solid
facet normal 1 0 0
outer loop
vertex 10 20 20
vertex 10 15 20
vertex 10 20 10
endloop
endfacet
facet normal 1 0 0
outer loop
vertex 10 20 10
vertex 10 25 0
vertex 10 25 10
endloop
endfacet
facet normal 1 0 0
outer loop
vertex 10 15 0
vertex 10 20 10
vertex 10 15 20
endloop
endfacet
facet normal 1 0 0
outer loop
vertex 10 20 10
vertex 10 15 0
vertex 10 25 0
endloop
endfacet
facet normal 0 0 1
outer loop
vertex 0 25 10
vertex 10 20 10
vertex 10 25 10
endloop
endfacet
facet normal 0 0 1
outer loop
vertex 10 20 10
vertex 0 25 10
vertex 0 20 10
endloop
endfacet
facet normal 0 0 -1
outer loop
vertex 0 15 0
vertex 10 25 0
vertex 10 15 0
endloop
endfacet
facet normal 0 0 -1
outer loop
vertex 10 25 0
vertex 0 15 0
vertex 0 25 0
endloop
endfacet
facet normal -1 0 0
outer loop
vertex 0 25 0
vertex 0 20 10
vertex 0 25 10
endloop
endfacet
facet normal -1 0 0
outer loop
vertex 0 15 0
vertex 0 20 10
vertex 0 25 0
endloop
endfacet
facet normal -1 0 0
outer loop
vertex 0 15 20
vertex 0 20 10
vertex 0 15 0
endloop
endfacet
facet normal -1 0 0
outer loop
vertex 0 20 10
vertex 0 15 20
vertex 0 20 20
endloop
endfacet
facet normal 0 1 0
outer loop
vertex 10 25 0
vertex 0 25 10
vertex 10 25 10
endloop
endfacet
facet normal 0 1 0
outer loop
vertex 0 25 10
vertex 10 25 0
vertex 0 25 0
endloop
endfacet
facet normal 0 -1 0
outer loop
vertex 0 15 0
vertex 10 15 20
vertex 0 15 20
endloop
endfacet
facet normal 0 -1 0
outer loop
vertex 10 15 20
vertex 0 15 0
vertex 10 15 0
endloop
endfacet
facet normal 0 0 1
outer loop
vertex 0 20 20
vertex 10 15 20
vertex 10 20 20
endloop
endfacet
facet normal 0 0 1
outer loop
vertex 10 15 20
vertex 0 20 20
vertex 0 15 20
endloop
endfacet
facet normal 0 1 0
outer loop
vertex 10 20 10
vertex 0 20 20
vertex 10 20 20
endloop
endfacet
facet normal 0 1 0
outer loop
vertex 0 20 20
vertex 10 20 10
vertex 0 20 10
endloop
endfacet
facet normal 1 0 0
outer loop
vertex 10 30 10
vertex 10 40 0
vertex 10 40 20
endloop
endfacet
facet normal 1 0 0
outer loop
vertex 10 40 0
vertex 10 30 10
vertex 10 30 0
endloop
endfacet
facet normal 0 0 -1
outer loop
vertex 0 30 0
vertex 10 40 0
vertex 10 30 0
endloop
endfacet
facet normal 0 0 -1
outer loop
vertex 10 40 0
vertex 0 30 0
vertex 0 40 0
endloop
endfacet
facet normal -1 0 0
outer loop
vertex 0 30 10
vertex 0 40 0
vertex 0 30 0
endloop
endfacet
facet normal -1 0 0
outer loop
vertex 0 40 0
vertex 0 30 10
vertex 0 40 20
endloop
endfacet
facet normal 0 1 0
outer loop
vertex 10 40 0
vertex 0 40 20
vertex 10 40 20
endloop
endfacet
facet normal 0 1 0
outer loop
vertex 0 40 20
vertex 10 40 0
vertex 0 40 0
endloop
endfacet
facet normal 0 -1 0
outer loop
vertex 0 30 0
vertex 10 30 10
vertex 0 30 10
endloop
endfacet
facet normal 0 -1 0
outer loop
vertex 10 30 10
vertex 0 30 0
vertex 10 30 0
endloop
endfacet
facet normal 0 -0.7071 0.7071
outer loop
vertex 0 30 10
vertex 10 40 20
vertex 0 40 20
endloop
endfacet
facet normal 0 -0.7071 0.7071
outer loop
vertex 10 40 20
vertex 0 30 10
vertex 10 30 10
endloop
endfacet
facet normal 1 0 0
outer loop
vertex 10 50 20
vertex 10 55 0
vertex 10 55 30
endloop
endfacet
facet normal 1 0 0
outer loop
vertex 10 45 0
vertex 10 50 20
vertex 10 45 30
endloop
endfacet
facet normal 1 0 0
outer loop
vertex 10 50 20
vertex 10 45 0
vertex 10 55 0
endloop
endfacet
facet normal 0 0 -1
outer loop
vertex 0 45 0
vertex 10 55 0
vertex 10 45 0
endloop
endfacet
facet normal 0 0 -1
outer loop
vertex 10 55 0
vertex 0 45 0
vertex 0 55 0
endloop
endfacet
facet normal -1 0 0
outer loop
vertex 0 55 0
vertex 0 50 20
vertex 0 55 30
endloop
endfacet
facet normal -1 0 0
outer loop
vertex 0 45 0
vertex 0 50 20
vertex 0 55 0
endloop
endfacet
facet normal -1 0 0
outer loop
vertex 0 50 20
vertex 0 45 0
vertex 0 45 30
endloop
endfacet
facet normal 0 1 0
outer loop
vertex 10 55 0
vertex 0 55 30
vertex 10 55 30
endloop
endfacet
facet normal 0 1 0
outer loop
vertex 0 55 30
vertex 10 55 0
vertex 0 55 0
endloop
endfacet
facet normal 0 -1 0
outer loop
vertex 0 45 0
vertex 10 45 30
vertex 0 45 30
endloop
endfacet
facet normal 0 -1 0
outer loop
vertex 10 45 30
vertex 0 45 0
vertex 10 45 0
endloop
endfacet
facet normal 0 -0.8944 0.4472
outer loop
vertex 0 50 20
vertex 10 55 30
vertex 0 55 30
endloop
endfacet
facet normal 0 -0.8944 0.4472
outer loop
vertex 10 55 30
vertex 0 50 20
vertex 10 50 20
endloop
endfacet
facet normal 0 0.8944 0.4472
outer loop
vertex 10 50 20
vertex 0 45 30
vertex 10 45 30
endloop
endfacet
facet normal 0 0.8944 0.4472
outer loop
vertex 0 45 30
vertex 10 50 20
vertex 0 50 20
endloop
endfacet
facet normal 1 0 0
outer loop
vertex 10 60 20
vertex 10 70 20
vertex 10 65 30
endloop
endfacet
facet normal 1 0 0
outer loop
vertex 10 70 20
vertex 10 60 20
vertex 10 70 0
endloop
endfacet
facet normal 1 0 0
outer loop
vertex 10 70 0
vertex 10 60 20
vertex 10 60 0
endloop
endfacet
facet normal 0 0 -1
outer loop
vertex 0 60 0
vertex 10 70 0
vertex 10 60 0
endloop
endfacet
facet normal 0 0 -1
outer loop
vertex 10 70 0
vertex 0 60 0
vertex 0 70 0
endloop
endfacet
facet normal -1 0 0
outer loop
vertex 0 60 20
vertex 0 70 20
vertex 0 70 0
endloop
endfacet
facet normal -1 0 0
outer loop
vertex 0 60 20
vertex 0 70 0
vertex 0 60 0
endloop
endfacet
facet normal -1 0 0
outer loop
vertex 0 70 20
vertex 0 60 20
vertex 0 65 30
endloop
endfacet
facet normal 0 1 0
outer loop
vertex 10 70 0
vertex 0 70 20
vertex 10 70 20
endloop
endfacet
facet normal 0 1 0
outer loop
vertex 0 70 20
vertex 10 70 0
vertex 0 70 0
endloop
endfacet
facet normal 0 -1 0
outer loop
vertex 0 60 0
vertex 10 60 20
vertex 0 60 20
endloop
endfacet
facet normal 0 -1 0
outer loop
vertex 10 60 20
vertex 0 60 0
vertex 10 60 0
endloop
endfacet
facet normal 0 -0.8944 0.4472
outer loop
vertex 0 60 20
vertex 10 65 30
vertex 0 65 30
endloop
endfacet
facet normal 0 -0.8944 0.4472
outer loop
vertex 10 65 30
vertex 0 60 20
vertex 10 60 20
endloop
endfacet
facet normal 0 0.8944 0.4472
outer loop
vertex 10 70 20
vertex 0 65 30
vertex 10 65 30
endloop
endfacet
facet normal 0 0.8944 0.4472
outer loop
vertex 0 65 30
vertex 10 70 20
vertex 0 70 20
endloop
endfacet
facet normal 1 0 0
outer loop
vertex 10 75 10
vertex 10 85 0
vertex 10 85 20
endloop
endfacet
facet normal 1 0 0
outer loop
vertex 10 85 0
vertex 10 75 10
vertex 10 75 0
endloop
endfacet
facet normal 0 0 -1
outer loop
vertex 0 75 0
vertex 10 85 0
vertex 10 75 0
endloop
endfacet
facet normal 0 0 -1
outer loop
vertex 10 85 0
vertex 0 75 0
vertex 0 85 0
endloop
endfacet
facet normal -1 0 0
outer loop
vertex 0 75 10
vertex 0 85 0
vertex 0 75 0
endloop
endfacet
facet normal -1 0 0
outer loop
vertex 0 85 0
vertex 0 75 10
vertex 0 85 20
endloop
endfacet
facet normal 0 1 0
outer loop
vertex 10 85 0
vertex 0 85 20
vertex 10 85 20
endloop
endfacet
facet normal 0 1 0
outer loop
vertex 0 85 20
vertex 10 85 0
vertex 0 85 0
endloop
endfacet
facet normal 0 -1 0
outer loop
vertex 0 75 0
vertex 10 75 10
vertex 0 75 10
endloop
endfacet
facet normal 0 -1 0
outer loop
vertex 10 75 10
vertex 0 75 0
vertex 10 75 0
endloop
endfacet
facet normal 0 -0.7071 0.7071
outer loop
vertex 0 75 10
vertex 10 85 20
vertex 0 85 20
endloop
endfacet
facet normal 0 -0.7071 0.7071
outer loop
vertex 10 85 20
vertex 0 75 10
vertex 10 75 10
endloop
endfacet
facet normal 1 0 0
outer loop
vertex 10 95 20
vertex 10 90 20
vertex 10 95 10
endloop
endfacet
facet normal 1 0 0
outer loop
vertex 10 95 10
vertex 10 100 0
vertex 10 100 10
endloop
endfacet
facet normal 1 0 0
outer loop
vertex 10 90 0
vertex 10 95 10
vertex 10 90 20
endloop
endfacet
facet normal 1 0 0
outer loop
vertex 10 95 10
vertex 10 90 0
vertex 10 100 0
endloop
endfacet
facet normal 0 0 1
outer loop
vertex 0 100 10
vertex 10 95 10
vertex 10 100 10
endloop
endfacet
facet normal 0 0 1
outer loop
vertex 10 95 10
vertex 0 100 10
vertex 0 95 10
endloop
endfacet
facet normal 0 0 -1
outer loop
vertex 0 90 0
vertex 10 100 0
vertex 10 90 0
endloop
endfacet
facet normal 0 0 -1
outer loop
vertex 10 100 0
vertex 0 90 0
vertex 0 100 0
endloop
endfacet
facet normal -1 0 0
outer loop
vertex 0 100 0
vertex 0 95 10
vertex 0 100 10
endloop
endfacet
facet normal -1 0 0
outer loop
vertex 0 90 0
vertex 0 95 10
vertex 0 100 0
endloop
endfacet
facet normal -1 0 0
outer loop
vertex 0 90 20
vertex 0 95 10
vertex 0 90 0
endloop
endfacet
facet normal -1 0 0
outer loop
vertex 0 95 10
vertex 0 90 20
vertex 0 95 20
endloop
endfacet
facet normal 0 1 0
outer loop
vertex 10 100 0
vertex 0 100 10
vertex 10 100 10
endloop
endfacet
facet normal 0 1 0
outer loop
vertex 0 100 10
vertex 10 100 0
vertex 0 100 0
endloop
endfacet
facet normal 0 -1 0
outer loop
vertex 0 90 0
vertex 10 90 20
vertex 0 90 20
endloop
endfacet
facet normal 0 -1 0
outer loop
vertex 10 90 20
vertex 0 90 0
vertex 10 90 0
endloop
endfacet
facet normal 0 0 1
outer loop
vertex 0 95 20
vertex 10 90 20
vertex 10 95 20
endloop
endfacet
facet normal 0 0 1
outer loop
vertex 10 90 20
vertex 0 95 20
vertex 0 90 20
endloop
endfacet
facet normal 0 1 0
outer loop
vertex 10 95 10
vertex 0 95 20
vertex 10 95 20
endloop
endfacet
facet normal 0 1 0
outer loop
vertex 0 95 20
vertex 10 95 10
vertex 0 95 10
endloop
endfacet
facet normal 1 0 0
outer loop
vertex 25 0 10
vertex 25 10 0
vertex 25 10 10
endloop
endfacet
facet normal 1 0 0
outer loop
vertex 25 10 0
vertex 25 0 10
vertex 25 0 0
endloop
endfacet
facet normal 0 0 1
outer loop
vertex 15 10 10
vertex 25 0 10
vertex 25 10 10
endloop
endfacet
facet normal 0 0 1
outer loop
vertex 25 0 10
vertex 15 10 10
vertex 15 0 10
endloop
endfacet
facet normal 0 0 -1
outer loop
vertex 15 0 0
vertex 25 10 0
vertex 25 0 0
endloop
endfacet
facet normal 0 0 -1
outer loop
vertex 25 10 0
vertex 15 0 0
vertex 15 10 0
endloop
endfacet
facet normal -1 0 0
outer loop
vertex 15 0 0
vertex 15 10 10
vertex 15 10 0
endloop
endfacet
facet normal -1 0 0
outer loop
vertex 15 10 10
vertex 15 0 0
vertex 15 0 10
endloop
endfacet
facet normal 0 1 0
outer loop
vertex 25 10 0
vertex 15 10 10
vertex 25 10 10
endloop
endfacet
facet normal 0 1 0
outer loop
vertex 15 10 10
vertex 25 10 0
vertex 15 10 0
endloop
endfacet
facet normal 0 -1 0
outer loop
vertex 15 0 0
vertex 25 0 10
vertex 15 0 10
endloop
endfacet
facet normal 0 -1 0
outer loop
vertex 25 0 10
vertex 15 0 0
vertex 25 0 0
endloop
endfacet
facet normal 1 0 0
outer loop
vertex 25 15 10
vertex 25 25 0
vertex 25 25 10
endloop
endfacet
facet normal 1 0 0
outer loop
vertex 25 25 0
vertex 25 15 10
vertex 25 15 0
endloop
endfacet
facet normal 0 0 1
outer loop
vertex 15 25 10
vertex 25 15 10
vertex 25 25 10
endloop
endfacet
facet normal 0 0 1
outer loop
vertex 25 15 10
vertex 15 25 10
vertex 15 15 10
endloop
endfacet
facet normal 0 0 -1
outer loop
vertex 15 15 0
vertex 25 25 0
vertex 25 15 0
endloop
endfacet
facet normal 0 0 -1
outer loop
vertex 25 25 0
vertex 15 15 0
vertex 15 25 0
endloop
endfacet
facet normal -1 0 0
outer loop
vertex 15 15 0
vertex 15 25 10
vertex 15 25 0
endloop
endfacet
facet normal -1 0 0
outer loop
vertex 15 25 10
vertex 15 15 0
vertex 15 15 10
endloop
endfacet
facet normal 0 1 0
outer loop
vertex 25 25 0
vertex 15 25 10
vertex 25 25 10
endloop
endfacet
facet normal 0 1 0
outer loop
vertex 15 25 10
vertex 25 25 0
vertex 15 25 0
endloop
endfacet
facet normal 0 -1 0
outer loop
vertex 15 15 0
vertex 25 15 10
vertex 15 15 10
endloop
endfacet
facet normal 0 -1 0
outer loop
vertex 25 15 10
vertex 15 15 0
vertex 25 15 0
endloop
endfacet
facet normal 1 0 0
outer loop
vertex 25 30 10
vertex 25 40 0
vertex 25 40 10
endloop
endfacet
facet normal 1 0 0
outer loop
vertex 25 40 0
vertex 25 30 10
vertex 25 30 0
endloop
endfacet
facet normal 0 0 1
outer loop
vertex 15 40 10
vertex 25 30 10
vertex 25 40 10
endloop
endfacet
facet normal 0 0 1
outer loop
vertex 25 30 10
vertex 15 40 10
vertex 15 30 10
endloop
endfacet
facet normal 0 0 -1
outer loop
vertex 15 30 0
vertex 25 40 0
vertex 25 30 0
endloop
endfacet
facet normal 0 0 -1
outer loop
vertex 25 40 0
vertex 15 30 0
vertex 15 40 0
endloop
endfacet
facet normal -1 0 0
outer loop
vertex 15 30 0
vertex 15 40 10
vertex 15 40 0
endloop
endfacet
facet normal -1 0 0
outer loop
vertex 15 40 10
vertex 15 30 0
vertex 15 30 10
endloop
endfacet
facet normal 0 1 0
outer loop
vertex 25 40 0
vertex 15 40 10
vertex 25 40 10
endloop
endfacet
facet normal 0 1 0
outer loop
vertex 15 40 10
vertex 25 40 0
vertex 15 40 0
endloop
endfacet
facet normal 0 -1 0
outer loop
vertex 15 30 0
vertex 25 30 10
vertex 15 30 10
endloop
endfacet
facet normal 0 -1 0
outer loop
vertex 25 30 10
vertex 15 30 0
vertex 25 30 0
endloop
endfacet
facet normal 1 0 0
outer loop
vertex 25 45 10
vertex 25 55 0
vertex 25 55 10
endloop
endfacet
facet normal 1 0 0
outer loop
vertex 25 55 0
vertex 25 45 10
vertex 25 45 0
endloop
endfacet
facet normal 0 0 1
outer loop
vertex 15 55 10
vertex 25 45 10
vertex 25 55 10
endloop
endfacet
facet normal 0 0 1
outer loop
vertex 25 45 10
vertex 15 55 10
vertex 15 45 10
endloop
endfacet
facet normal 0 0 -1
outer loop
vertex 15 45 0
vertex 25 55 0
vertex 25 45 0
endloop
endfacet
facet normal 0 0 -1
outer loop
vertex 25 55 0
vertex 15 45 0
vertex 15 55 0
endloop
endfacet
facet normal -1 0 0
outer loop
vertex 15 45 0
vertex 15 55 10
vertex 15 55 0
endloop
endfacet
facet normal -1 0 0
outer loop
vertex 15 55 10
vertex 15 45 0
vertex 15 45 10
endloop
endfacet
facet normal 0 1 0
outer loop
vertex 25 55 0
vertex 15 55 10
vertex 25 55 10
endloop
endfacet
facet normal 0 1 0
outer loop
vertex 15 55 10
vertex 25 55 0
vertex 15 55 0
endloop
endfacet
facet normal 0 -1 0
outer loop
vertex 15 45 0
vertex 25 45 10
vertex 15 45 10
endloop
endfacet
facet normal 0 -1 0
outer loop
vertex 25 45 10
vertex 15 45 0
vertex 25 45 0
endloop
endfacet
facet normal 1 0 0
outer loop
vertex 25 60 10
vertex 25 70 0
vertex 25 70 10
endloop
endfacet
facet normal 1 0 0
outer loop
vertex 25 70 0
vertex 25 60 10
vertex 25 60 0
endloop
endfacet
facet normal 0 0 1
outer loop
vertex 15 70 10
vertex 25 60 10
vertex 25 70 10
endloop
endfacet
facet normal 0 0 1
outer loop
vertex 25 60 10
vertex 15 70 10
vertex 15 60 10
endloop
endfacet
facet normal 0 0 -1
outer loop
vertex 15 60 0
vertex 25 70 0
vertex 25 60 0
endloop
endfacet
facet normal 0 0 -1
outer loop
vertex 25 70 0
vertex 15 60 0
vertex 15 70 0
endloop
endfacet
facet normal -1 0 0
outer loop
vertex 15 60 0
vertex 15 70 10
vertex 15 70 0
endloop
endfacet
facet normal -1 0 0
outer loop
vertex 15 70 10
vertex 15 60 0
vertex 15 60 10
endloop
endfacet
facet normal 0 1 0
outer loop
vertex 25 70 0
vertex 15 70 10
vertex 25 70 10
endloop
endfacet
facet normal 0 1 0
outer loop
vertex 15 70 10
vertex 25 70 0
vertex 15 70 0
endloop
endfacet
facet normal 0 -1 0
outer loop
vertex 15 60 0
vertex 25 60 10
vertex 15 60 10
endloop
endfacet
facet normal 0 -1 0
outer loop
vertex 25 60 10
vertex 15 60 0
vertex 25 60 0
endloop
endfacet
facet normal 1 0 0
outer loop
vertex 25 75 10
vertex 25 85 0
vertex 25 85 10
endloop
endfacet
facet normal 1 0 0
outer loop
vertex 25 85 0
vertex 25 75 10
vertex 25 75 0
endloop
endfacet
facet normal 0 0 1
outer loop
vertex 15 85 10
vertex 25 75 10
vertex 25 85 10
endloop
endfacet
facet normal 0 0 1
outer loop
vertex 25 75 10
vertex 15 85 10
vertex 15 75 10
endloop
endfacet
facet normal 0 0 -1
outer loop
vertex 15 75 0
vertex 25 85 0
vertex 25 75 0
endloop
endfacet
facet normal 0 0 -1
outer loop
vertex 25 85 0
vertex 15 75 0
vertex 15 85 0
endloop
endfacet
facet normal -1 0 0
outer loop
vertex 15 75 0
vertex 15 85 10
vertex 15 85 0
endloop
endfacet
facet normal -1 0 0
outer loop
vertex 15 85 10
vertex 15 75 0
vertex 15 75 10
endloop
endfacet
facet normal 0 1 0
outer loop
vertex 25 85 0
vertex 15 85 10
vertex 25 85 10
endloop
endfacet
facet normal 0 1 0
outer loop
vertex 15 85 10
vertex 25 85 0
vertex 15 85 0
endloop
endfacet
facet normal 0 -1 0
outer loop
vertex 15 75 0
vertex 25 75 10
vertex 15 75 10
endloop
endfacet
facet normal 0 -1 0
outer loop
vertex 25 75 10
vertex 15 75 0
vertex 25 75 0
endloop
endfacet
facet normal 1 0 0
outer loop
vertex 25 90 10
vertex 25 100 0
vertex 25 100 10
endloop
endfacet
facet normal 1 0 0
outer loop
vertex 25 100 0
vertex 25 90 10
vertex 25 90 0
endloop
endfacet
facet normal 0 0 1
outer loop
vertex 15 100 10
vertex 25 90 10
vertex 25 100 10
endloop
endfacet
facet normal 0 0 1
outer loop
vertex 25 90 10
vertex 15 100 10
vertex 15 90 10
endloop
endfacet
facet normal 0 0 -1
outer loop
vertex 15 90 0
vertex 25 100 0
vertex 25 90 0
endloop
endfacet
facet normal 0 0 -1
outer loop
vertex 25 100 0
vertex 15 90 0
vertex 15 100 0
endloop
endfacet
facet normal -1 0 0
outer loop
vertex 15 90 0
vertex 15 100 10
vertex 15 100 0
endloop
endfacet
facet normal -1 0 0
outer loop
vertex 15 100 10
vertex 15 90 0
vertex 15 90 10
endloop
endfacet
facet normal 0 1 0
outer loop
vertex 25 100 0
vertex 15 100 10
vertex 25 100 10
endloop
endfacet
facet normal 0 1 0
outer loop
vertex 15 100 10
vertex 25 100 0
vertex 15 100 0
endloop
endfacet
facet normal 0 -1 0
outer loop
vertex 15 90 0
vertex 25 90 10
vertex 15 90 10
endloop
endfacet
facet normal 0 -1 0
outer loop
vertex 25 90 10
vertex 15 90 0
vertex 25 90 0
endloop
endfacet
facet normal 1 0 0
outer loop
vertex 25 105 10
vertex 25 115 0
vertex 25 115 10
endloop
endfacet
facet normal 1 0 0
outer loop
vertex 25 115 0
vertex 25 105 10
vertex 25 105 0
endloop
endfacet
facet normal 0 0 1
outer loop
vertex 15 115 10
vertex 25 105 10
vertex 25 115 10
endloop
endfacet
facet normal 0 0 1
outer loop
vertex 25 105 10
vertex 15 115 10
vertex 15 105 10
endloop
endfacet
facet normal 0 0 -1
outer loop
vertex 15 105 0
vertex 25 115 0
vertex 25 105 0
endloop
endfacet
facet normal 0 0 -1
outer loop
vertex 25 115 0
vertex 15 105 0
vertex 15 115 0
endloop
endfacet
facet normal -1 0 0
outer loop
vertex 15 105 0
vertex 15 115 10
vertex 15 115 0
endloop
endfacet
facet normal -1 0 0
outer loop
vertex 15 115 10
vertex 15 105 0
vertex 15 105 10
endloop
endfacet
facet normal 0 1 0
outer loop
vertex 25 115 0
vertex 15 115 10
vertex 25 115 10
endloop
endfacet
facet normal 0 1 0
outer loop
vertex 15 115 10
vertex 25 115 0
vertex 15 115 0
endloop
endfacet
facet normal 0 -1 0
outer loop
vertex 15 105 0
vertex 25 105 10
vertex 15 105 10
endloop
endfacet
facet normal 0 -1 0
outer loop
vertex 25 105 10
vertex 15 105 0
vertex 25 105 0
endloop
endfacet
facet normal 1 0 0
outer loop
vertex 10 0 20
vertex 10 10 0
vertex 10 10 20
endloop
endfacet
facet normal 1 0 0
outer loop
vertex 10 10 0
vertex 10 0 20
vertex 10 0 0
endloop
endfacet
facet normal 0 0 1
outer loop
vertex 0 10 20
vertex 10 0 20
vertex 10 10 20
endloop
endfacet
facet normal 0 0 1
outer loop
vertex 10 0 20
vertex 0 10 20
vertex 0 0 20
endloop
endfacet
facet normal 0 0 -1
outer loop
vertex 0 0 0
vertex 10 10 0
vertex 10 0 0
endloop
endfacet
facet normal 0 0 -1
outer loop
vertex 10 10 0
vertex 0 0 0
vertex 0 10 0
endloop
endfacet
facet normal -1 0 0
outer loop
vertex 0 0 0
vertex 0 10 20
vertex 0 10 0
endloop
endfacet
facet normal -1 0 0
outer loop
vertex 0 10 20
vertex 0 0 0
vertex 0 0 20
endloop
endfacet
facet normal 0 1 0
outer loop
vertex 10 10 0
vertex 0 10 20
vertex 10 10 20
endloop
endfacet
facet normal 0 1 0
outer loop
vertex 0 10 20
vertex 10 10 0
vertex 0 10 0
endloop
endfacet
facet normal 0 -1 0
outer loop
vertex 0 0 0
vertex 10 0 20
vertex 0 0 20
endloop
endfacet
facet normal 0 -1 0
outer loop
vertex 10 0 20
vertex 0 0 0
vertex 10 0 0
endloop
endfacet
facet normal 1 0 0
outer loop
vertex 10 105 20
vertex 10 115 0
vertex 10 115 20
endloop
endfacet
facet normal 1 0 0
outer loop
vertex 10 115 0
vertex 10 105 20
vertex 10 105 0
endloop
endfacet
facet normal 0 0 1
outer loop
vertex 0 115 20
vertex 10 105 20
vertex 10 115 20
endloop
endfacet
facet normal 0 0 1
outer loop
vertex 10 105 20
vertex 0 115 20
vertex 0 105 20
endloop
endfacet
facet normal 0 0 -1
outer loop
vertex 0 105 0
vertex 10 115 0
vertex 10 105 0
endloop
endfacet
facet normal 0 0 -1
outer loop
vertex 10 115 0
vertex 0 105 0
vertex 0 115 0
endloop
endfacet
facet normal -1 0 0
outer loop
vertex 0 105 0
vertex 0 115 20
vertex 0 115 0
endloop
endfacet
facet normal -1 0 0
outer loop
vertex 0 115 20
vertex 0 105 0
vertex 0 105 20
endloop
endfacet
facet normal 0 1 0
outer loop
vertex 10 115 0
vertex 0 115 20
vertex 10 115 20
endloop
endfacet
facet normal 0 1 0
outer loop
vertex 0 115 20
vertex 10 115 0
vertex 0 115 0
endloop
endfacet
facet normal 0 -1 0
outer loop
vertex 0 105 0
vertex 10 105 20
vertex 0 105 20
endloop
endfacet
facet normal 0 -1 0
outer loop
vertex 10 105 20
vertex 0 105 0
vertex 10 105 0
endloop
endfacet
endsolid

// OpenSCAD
H=10;
L=10;
W=10;
S=5;
D=3;

// --------------------------------
// --------------------------------
// --------------------------------

//board();
//pawnGrid();

translate([0,0*(H+S),0])rook();
translate([0,1*(H+S),0])knight();
translate([0,2*(H+S),0])bishop();
translate([0,3*(H+S),0])queen();
translate([0,4*(H+S),0])king();
translate([0,5*(H+S),0])bishop();
translate([0,6*(H+S),0])knight();
translate([0,7*(H+S),0])rook();
translate([H+S,0,0])pawnRow();

// --------------------------------
// --------------------------------
// --------------------------------

module prism(l, w, h){
       polyhedron(
               points=[[0,0,0], [l,0,0], [l,w,0], [0,w,0], [0,w,h], [l,w,h]],
               faces=[[0,1,2,3],[5,4,3,2],[0,4,5,1],[0,3,4],[5,2,1]]
               );
}


// Complex pieces
module king(){
	union(){
	cube([H,H,H*2]);
	translate([0,0,2*H])prism(H,H/2,H);
	translate([0,H,2*H])prism(H,-H/2,H);
}
}

module queen(){  
	union(){
	cube([H,H,2*H]); 

	translate([0,H/2,2*H])prism(H,H/2,H);
	translate([H,H/2,2*H])rotate([0,0,180])prism(H,H/2,H);
	}
}


// Simple pieces
module pawn(){ cube([H,H,H]); }
module rook(){ cube([H,H,2*H]); }
module knight(){ 
	union(){
	cube([H,H,H]); 
	translate([0,0,H])cube([H,H/2,H]);
	}
}
module bishop(){
	union(){
	cube([H,H,H]);
	translate([0,0,H])prism(H,H,H);
	}
}

// Chess board
module pawnRow(){
	translate([0,0,0])pawn();
	translate([0,H+S,0])pawn();
	translate([0,2*(H+S),0])pawn();
	translate([0,3*(H+S),0])pawn();
	translate([0,4*(H+S),0])pawn();
	translate([0,5*(H+S),0])pawn();
	translate([0,6*(H+S),0])pawn();
	translate([0,7*(H+S),0])pawn();
}

module pawnGrid(){
	translate([0,0,0])pawnRow();
	translate([H+S,0,0])pawnRow();
	translate([2*(H+S),0,0])pawnRow();
	translate([3*(H+S),0,0])pawnRow();
	translate([4*(H+S),0,0])pawnRow();
	translate([5*(H+S),0,0])pawnRow();
	translate([6*(H+S),0,0])pawnRow();
	translate([7*(H+S),0,0])pawnRow();
}

module board(){
	difference(){
		translate([-S,-S,H-2])cube([8*(H+S)+2*S,8*(H+S)+2*S,3]);
     	pawnGrid();
   }
}
